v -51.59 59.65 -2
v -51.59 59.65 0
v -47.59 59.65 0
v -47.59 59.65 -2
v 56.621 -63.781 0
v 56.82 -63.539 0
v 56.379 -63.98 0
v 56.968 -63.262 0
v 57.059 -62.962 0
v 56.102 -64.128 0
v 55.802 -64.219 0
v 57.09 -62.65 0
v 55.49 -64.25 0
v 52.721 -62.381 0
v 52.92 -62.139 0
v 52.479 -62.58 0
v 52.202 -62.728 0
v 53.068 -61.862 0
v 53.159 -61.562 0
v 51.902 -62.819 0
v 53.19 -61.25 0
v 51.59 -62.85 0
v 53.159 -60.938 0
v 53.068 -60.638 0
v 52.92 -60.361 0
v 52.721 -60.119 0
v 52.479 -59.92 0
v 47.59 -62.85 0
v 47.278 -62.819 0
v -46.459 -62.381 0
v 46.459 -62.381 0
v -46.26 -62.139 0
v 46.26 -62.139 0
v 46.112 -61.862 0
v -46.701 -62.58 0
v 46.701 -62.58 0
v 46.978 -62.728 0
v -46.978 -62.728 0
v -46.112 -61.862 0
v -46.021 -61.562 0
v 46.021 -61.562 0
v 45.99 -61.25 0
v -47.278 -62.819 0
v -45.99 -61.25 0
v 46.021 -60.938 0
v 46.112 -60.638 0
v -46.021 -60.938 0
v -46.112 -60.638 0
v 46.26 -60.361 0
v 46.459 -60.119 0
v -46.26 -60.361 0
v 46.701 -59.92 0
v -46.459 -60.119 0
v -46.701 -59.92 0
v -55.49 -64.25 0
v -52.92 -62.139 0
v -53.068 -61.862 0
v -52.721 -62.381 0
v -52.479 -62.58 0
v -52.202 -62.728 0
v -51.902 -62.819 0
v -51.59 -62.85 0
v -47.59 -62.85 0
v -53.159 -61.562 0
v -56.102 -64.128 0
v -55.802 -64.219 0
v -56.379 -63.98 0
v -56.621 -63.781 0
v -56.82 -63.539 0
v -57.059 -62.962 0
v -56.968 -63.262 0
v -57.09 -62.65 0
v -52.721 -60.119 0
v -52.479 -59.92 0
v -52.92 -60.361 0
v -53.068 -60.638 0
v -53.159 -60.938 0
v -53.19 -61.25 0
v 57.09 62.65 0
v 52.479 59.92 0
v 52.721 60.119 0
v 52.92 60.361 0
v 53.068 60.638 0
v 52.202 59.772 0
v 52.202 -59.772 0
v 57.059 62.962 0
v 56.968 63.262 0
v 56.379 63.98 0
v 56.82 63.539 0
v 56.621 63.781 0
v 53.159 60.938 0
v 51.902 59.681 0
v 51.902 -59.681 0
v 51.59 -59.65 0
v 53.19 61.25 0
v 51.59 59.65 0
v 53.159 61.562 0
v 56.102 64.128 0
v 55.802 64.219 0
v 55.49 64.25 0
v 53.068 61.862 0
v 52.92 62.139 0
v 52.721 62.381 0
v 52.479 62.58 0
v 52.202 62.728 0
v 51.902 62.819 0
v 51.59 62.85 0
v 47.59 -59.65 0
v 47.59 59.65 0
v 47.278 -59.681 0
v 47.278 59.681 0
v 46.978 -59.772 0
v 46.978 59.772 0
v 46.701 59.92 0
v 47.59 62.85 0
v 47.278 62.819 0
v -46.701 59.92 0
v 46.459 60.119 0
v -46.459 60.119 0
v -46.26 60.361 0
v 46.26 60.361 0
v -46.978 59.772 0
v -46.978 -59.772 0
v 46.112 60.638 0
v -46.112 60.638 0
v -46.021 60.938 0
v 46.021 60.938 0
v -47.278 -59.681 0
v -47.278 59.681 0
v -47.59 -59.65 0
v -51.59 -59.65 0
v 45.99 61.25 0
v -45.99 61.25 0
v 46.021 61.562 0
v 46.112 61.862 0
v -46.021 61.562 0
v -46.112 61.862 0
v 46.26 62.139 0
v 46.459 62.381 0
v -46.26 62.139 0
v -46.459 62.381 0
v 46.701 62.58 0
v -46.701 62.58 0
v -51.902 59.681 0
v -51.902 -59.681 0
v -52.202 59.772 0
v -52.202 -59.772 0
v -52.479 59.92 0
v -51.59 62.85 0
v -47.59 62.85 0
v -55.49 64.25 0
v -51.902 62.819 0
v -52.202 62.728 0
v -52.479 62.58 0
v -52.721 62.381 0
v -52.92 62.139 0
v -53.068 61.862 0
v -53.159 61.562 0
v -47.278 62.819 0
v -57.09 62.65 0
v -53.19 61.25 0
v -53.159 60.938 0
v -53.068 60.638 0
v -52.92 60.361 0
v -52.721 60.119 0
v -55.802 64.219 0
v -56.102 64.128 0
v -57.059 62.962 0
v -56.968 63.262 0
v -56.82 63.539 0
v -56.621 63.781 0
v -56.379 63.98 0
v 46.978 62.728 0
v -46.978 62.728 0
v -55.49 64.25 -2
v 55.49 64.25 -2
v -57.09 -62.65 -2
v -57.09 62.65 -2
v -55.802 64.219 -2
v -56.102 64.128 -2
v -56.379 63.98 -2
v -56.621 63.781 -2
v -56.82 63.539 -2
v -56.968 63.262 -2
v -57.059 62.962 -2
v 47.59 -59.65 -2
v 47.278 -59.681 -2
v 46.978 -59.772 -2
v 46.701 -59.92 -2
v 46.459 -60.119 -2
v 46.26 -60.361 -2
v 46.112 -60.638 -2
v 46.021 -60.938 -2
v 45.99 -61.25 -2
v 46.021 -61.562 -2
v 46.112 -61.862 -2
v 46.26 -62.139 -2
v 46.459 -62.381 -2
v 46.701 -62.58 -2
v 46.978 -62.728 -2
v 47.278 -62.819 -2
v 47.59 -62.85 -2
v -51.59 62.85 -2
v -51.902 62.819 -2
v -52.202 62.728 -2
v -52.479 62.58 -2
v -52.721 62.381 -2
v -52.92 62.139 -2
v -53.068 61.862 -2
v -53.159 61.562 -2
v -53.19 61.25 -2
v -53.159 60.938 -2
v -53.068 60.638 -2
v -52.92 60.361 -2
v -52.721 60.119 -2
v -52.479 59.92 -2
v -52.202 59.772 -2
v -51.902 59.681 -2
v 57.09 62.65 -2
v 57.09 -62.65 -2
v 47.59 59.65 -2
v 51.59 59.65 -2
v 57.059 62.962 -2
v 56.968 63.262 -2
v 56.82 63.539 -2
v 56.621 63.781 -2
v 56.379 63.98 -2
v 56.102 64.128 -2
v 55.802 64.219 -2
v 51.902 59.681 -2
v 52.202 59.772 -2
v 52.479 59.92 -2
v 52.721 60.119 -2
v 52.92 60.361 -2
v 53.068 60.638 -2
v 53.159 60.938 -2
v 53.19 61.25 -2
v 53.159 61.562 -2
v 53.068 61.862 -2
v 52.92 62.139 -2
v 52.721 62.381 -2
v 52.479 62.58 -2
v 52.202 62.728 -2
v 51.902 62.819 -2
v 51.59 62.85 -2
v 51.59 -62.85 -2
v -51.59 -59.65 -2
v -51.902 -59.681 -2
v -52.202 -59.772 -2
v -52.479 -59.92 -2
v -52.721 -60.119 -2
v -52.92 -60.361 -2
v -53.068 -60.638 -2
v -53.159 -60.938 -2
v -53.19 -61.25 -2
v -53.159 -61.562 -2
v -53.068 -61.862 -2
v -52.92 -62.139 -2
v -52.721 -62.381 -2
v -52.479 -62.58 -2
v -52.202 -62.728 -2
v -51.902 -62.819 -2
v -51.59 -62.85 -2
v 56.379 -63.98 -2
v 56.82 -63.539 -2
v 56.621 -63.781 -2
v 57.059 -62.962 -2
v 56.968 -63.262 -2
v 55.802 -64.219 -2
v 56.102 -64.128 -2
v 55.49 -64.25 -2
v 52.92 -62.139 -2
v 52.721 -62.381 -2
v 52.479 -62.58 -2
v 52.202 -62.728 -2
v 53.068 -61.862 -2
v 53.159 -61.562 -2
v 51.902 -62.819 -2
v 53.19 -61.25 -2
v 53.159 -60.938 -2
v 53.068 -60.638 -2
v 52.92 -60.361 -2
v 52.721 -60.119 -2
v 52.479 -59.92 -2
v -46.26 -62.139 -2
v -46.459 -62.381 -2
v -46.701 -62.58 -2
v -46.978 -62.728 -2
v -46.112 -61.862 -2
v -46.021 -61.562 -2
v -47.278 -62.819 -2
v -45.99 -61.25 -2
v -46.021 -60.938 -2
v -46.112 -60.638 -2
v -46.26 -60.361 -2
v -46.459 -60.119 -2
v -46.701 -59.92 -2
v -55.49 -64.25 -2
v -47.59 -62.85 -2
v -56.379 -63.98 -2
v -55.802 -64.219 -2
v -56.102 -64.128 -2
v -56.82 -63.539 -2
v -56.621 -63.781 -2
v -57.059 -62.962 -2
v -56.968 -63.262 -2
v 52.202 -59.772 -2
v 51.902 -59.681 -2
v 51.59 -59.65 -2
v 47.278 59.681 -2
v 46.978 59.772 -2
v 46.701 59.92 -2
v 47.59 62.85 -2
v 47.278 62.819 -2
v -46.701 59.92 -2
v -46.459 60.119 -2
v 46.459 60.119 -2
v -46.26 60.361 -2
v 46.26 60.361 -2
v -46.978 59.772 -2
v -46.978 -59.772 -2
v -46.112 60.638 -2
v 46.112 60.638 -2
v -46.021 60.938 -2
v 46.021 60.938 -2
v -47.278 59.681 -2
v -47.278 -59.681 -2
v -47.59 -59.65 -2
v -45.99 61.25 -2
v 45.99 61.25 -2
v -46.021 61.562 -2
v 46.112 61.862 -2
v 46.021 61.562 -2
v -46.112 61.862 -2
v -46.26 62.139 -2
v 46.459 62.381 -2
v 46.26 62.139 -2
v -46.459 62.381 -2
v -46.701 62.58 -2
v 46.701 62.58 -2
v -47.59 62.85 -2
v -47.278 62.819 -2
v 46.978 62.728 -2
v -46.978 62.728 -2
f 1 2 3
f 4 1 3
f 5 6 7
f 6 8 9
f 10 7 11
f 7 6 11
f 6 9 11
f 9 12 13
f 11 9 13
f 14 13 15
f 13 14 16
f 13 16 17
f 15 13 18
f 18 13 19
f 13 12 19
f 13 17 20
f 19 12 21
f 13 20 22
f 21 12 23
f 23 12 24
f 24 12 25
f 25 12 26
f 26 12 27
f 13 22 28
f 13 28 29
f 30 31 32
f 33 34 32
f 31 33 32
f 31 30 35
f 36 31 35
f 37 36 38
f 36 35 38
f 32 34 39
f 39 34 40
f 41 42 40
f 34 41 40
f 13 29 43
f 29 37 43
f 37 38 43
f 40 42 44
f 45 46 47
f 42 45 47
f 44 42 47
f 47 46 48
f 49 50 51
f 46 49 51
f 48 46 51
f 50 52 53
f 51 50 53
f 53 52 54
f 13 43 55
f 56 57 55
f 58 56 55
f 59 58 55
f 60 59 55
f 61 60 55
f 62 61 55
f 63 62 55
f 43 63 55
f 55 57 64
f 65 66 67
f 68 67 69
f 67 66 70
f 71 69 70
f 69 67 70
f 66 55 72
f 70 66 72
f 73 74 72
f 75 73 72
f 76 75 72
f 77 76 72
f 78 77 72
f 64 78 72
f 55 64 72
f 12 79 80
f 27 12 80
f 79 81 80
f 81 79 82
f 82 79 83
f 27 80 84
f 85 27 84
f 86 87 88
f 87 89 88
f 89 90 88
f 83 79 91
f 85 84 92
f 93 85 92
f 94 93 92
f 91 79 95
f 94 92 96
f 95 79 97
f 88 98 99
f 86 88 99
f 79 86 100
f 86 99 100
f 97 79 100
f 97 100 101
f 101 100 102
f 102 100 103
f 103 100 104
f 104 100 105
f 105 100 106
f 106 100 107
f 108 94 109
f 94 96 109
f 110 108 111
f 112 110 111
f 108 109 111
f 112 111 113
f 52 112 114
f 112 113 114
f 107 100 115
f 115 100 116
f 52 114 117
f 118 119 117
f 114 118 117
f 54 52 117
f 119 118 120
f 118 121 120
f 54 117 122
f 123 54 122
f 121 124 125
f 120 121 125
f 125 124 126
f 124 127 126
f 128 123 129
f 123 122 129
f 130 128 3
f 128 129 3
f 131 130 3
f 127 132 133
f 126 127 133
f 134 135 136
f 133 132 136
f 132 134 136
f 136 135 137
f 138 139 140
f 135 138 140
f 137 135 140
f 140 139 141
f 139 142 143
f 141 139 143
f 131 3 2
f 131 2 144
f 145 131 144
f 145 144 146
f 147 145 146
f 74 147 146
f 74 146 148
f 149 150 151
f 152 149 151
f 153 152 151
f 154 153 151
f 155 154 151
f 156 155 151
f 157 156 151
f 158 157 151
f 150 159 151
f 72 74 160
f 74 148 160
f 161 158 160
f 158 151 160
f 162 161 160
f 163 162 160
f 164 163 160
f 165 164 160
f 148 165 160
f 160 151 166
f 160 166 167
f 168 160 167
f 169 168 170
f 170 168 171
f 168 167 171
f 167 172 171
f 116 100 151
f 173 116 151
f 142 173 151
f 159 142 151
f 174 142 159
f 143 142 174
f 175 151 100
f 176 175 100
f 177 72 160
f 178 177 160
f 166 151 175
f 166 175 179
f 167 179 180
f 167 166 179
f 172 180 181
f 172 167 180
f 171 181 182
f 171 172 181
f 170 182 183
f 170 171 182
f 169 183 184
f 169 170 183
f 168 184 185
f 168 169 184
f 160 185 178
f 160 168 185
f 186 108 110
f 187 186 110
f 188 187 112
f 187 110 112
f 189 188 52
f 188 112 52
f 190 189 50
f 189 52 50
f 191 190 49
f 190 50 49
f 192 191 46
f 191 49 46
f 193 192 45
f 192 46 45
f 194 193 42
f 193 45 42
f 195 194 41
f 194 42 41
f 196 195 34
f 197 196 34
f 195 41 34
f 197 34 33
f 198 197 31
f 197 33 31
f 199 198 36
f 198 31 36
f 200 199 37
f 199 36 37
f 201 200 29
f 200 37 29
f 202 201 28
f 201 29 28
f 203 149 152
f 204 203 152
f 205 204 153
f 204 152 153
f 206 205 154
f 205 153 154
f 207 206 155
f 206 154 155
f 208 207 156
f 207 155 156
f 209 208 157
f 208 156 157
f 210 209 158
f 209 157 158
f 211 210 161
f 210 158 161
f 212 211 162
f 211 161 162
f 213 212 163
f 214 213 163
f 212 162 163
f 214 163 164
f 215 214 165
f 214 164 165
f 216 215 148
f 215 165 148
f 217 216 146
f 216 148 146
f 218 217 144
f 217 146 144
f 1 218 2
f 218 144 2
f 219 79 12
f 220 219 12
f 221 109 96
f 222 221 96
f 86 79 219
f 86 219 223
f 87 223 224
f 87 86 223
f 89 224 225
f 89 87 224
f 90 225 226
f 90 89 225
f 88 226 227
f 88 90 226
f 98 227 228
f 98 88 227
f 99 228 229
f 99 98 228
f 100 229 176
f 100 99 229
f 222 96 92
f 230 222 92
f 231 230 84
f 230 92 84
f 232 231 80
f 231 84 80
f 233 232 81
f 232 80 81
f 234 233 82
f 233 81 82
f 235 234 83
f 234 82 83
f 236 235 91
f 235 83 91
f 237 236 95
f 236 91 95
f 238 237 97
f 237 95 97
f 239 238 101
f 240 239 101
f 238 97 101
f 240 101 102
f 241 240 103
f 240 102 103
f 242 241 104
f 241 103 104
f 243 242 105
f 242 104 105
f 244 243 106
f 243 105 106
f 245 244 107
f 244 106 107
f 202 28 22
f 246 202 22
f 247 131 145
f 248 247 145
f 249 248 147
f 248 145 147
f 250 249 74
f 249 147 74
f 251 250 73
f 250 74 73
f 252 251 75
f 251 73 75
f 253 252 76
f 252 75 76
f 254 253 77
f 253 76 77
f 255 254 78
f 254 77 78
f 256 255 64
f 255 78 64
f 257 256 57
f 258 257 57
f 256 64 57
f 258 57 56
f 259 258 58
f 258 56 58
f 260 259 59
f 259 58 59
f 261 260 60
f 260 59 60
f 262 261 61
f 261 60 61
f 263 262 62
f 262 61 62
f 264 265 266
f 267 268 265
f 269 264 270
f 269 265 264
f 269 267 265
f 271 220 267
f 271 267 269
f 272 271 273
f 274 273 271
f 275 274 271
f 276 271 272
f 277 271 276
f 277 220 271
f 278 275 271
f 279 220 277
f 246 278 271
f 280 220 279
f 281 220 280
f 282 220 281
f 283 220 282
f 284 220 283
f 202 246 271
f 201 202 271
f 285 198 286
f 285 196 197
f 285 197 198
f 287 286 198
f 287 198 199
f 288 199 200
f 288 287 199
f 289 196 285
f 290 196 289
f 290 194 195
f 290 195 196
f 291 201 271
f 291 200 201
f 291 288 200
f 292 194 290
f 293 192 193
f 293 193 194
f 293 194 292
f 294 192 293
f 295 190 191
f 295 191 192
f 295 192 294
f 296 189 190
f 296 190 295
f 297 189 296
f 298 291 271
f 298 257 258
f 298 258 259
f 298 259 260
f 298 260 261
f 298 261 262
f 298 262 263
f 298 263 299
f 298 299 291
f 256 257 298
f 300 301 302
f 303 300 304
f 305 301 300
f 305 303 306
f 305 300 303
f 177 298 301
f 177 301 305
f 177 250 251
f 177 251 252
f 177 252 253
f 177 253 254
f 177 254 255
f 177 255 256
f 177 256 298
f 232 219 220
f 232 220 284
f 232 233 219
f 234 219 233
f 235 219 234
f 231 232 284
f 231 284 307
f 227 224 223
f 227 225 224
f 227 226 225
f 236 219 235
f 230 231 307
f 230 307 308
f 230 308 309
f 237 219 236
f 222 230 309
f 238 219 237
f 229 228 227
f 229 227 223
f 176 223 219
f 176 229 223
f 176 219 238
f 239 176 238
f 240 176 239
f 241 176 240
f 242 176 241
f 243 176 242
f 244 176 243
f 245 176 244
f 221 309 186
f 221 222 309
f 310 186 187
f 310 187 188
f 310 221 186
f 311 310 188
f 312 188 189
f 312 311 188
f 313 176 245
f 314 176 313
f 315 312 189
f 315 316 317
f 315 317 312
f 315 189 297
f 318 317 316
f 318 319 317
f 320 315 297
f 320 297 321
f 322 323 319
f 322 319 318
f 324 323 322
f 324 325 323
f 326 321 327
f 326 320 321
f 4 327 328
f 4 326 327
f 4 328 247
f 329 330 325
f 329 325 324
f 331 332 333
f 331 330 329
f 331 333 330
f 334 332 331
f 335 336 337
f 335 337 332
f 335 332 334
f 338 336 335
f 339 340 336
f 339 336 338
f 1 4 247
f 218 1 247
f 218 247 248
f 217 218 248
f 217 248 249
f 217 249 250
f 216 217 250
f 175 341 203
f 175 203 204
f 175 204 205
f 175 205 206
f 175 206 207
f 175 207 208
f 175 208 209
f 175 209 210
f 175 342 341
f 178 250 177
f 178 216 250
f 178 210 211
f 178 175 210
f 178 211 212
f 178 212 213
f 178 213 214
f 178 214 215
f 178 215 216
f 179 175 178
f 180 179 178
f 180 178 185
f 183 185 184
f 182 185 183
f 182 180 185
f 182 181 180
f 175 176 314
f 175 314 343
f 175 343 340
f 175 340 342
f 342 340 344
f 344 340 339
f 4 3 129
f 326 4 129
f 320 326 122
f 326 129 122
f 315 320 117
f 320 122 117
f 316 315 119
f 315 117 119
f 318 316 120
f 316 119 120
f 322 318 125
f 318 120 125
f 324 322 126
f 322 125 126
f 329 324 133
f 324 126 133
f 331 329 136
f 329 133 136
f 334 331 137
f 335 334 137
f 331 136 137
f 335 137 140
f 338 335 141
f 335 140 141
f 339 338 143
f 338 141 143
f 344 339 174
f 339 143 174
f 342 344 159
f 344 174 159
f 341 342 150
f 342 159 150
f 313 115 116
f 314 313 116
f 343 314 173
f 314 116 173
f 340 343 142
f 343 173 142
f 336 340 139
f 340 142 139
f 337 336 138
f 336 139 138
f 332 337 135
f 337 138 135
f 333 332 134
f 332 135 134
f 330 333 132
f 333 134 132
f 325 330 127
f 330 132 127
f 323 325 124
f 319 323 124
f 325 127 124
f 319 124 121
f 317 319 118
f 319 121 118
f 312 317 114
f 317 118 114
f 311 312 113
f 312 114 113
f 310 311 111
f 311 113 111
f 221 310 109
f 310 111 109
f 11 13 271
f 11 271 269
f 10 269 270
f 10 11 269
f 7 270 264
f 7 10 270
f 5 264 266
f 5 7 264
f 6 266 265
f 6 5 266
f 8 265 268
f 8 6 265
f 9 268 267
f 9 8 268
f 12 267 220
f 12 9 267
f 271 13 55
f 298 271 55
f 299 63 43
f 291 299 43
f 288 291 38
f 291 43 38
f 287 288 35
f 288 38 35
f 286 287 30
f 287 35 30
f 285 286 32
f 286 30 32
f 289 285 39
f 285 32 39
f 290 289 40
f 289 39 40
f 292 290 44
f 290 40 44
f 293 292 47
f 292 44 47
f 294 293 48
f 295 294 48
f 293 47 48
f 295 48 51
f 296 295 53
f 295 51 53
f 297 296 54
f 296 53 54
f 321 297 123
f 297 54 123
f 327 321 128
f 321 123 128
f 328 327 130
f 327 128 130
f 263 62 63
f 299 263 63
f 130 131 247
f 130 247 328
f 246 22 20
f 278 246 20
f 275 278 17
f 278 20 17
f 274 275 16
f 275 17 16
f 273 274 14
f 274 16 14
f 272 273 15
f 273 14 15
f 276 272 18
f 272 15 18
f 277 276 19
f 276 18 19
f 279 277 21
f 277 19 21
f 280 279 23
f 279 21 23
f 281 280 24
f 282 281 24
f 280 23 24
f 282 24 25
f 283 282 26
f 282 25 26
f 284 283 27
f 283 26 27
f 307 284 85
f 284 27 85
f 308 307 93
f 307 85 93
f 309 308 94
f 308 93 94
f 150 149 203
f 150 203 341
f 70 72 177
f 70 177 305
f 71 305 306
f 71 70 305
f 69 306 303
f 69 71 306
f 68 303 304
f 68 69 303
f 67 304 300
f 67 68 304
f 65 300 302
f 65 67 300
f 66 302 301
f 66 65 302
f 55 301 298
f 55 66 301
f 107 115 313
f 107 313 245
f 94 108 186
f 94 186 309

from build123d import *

# Parameters (mm, degrees)
EXTRUDE_DEPTH = 2


with BuildPart() as part:
    # Sketch → Extrude (new body)
    with BuildSketch(Plane.XY):
        with BuildLine():
            Line((-55.49, 64.25), (55.49, 64.25))
            ThreePointArc((57.09, 62.65), (56.621371, 63.781371), (55.49, 64.25))
            Line((57.09, 62.65), (57.09, -62.65))
            ThreePointArc((55.49, -64.25), (56.621371, -63.781371), (57.09, -62.65))
            Line((55.49, -64.25), (-55.49, -64.25))
            ThreePointArc((-57.09, -62.65), (-56.621371, -63.781371), (-55.49, -64.25))
            Line((-57.09, -62.65), (-57.09, 62.65))
            ThreePointArc((-55.49, 64.25), (-56.621371, 63.781371), (-57.09, 62.65))
        make_face()
        with BuildLine():
            ThreePointArc((-51.59, 62.85), (-53.19, 61.25), (-51.59, 59.65))
            Line((-51.59, 59.65), (-47.59, 59.65))
            ThreePointArc((-47.59, 59.65), (-45.99, 61.25), (-47.59, 62.85))
            Line((-51.59, 62.85), (-47.59, 62.85))
        make_face(mode=Mode.SUBTRACT)
        with BuildLine():
            ThreePointArc((47.59, 62.85), (45.99, 61.25), (47.59, 59.65))
            Line((47.59, 59.65), (51.59, 59.65))
            ThreePointArc((51.59, 59.65), (53.19, 61.25), (51.59, 62.85))
            Line((47.59, 62.85), (51.59, 62.85))
        make_face(mode=Mode.SUBTRACT)
        with BuildLine():
            ThreePointArc((-51.59, -59.65), (-53.19, -61.25), (-51.59, -62.85))
            Line((-51.59, -62.85), (-47.59, -62.85))
            ThreePointArc((-47.59, -62.85), (-45.99, -61.25), (-47.59, -59.65))
            Line((-51.59, -59.65), (-47.59, -59.65))
        make_face(mode=Mode.SUBTRACT)
        with BuildLine():
            ThreePointArc((47.59, -59.65), (45.99, -61.25), (47.59, -62.85))
            Line((47.59, -62.85), (51.59, -62.85))
            ThreePointArc((51.59, -62.85), (53.19, -61.25), (51.59, -59.65))
            Line((47.59, -59.65), (51.59, -59.65))
        make_face(mode=Mode.SUBTRACT)
    extrude(amount=-EXTRUDE_DEPTH)


solid = part.part
